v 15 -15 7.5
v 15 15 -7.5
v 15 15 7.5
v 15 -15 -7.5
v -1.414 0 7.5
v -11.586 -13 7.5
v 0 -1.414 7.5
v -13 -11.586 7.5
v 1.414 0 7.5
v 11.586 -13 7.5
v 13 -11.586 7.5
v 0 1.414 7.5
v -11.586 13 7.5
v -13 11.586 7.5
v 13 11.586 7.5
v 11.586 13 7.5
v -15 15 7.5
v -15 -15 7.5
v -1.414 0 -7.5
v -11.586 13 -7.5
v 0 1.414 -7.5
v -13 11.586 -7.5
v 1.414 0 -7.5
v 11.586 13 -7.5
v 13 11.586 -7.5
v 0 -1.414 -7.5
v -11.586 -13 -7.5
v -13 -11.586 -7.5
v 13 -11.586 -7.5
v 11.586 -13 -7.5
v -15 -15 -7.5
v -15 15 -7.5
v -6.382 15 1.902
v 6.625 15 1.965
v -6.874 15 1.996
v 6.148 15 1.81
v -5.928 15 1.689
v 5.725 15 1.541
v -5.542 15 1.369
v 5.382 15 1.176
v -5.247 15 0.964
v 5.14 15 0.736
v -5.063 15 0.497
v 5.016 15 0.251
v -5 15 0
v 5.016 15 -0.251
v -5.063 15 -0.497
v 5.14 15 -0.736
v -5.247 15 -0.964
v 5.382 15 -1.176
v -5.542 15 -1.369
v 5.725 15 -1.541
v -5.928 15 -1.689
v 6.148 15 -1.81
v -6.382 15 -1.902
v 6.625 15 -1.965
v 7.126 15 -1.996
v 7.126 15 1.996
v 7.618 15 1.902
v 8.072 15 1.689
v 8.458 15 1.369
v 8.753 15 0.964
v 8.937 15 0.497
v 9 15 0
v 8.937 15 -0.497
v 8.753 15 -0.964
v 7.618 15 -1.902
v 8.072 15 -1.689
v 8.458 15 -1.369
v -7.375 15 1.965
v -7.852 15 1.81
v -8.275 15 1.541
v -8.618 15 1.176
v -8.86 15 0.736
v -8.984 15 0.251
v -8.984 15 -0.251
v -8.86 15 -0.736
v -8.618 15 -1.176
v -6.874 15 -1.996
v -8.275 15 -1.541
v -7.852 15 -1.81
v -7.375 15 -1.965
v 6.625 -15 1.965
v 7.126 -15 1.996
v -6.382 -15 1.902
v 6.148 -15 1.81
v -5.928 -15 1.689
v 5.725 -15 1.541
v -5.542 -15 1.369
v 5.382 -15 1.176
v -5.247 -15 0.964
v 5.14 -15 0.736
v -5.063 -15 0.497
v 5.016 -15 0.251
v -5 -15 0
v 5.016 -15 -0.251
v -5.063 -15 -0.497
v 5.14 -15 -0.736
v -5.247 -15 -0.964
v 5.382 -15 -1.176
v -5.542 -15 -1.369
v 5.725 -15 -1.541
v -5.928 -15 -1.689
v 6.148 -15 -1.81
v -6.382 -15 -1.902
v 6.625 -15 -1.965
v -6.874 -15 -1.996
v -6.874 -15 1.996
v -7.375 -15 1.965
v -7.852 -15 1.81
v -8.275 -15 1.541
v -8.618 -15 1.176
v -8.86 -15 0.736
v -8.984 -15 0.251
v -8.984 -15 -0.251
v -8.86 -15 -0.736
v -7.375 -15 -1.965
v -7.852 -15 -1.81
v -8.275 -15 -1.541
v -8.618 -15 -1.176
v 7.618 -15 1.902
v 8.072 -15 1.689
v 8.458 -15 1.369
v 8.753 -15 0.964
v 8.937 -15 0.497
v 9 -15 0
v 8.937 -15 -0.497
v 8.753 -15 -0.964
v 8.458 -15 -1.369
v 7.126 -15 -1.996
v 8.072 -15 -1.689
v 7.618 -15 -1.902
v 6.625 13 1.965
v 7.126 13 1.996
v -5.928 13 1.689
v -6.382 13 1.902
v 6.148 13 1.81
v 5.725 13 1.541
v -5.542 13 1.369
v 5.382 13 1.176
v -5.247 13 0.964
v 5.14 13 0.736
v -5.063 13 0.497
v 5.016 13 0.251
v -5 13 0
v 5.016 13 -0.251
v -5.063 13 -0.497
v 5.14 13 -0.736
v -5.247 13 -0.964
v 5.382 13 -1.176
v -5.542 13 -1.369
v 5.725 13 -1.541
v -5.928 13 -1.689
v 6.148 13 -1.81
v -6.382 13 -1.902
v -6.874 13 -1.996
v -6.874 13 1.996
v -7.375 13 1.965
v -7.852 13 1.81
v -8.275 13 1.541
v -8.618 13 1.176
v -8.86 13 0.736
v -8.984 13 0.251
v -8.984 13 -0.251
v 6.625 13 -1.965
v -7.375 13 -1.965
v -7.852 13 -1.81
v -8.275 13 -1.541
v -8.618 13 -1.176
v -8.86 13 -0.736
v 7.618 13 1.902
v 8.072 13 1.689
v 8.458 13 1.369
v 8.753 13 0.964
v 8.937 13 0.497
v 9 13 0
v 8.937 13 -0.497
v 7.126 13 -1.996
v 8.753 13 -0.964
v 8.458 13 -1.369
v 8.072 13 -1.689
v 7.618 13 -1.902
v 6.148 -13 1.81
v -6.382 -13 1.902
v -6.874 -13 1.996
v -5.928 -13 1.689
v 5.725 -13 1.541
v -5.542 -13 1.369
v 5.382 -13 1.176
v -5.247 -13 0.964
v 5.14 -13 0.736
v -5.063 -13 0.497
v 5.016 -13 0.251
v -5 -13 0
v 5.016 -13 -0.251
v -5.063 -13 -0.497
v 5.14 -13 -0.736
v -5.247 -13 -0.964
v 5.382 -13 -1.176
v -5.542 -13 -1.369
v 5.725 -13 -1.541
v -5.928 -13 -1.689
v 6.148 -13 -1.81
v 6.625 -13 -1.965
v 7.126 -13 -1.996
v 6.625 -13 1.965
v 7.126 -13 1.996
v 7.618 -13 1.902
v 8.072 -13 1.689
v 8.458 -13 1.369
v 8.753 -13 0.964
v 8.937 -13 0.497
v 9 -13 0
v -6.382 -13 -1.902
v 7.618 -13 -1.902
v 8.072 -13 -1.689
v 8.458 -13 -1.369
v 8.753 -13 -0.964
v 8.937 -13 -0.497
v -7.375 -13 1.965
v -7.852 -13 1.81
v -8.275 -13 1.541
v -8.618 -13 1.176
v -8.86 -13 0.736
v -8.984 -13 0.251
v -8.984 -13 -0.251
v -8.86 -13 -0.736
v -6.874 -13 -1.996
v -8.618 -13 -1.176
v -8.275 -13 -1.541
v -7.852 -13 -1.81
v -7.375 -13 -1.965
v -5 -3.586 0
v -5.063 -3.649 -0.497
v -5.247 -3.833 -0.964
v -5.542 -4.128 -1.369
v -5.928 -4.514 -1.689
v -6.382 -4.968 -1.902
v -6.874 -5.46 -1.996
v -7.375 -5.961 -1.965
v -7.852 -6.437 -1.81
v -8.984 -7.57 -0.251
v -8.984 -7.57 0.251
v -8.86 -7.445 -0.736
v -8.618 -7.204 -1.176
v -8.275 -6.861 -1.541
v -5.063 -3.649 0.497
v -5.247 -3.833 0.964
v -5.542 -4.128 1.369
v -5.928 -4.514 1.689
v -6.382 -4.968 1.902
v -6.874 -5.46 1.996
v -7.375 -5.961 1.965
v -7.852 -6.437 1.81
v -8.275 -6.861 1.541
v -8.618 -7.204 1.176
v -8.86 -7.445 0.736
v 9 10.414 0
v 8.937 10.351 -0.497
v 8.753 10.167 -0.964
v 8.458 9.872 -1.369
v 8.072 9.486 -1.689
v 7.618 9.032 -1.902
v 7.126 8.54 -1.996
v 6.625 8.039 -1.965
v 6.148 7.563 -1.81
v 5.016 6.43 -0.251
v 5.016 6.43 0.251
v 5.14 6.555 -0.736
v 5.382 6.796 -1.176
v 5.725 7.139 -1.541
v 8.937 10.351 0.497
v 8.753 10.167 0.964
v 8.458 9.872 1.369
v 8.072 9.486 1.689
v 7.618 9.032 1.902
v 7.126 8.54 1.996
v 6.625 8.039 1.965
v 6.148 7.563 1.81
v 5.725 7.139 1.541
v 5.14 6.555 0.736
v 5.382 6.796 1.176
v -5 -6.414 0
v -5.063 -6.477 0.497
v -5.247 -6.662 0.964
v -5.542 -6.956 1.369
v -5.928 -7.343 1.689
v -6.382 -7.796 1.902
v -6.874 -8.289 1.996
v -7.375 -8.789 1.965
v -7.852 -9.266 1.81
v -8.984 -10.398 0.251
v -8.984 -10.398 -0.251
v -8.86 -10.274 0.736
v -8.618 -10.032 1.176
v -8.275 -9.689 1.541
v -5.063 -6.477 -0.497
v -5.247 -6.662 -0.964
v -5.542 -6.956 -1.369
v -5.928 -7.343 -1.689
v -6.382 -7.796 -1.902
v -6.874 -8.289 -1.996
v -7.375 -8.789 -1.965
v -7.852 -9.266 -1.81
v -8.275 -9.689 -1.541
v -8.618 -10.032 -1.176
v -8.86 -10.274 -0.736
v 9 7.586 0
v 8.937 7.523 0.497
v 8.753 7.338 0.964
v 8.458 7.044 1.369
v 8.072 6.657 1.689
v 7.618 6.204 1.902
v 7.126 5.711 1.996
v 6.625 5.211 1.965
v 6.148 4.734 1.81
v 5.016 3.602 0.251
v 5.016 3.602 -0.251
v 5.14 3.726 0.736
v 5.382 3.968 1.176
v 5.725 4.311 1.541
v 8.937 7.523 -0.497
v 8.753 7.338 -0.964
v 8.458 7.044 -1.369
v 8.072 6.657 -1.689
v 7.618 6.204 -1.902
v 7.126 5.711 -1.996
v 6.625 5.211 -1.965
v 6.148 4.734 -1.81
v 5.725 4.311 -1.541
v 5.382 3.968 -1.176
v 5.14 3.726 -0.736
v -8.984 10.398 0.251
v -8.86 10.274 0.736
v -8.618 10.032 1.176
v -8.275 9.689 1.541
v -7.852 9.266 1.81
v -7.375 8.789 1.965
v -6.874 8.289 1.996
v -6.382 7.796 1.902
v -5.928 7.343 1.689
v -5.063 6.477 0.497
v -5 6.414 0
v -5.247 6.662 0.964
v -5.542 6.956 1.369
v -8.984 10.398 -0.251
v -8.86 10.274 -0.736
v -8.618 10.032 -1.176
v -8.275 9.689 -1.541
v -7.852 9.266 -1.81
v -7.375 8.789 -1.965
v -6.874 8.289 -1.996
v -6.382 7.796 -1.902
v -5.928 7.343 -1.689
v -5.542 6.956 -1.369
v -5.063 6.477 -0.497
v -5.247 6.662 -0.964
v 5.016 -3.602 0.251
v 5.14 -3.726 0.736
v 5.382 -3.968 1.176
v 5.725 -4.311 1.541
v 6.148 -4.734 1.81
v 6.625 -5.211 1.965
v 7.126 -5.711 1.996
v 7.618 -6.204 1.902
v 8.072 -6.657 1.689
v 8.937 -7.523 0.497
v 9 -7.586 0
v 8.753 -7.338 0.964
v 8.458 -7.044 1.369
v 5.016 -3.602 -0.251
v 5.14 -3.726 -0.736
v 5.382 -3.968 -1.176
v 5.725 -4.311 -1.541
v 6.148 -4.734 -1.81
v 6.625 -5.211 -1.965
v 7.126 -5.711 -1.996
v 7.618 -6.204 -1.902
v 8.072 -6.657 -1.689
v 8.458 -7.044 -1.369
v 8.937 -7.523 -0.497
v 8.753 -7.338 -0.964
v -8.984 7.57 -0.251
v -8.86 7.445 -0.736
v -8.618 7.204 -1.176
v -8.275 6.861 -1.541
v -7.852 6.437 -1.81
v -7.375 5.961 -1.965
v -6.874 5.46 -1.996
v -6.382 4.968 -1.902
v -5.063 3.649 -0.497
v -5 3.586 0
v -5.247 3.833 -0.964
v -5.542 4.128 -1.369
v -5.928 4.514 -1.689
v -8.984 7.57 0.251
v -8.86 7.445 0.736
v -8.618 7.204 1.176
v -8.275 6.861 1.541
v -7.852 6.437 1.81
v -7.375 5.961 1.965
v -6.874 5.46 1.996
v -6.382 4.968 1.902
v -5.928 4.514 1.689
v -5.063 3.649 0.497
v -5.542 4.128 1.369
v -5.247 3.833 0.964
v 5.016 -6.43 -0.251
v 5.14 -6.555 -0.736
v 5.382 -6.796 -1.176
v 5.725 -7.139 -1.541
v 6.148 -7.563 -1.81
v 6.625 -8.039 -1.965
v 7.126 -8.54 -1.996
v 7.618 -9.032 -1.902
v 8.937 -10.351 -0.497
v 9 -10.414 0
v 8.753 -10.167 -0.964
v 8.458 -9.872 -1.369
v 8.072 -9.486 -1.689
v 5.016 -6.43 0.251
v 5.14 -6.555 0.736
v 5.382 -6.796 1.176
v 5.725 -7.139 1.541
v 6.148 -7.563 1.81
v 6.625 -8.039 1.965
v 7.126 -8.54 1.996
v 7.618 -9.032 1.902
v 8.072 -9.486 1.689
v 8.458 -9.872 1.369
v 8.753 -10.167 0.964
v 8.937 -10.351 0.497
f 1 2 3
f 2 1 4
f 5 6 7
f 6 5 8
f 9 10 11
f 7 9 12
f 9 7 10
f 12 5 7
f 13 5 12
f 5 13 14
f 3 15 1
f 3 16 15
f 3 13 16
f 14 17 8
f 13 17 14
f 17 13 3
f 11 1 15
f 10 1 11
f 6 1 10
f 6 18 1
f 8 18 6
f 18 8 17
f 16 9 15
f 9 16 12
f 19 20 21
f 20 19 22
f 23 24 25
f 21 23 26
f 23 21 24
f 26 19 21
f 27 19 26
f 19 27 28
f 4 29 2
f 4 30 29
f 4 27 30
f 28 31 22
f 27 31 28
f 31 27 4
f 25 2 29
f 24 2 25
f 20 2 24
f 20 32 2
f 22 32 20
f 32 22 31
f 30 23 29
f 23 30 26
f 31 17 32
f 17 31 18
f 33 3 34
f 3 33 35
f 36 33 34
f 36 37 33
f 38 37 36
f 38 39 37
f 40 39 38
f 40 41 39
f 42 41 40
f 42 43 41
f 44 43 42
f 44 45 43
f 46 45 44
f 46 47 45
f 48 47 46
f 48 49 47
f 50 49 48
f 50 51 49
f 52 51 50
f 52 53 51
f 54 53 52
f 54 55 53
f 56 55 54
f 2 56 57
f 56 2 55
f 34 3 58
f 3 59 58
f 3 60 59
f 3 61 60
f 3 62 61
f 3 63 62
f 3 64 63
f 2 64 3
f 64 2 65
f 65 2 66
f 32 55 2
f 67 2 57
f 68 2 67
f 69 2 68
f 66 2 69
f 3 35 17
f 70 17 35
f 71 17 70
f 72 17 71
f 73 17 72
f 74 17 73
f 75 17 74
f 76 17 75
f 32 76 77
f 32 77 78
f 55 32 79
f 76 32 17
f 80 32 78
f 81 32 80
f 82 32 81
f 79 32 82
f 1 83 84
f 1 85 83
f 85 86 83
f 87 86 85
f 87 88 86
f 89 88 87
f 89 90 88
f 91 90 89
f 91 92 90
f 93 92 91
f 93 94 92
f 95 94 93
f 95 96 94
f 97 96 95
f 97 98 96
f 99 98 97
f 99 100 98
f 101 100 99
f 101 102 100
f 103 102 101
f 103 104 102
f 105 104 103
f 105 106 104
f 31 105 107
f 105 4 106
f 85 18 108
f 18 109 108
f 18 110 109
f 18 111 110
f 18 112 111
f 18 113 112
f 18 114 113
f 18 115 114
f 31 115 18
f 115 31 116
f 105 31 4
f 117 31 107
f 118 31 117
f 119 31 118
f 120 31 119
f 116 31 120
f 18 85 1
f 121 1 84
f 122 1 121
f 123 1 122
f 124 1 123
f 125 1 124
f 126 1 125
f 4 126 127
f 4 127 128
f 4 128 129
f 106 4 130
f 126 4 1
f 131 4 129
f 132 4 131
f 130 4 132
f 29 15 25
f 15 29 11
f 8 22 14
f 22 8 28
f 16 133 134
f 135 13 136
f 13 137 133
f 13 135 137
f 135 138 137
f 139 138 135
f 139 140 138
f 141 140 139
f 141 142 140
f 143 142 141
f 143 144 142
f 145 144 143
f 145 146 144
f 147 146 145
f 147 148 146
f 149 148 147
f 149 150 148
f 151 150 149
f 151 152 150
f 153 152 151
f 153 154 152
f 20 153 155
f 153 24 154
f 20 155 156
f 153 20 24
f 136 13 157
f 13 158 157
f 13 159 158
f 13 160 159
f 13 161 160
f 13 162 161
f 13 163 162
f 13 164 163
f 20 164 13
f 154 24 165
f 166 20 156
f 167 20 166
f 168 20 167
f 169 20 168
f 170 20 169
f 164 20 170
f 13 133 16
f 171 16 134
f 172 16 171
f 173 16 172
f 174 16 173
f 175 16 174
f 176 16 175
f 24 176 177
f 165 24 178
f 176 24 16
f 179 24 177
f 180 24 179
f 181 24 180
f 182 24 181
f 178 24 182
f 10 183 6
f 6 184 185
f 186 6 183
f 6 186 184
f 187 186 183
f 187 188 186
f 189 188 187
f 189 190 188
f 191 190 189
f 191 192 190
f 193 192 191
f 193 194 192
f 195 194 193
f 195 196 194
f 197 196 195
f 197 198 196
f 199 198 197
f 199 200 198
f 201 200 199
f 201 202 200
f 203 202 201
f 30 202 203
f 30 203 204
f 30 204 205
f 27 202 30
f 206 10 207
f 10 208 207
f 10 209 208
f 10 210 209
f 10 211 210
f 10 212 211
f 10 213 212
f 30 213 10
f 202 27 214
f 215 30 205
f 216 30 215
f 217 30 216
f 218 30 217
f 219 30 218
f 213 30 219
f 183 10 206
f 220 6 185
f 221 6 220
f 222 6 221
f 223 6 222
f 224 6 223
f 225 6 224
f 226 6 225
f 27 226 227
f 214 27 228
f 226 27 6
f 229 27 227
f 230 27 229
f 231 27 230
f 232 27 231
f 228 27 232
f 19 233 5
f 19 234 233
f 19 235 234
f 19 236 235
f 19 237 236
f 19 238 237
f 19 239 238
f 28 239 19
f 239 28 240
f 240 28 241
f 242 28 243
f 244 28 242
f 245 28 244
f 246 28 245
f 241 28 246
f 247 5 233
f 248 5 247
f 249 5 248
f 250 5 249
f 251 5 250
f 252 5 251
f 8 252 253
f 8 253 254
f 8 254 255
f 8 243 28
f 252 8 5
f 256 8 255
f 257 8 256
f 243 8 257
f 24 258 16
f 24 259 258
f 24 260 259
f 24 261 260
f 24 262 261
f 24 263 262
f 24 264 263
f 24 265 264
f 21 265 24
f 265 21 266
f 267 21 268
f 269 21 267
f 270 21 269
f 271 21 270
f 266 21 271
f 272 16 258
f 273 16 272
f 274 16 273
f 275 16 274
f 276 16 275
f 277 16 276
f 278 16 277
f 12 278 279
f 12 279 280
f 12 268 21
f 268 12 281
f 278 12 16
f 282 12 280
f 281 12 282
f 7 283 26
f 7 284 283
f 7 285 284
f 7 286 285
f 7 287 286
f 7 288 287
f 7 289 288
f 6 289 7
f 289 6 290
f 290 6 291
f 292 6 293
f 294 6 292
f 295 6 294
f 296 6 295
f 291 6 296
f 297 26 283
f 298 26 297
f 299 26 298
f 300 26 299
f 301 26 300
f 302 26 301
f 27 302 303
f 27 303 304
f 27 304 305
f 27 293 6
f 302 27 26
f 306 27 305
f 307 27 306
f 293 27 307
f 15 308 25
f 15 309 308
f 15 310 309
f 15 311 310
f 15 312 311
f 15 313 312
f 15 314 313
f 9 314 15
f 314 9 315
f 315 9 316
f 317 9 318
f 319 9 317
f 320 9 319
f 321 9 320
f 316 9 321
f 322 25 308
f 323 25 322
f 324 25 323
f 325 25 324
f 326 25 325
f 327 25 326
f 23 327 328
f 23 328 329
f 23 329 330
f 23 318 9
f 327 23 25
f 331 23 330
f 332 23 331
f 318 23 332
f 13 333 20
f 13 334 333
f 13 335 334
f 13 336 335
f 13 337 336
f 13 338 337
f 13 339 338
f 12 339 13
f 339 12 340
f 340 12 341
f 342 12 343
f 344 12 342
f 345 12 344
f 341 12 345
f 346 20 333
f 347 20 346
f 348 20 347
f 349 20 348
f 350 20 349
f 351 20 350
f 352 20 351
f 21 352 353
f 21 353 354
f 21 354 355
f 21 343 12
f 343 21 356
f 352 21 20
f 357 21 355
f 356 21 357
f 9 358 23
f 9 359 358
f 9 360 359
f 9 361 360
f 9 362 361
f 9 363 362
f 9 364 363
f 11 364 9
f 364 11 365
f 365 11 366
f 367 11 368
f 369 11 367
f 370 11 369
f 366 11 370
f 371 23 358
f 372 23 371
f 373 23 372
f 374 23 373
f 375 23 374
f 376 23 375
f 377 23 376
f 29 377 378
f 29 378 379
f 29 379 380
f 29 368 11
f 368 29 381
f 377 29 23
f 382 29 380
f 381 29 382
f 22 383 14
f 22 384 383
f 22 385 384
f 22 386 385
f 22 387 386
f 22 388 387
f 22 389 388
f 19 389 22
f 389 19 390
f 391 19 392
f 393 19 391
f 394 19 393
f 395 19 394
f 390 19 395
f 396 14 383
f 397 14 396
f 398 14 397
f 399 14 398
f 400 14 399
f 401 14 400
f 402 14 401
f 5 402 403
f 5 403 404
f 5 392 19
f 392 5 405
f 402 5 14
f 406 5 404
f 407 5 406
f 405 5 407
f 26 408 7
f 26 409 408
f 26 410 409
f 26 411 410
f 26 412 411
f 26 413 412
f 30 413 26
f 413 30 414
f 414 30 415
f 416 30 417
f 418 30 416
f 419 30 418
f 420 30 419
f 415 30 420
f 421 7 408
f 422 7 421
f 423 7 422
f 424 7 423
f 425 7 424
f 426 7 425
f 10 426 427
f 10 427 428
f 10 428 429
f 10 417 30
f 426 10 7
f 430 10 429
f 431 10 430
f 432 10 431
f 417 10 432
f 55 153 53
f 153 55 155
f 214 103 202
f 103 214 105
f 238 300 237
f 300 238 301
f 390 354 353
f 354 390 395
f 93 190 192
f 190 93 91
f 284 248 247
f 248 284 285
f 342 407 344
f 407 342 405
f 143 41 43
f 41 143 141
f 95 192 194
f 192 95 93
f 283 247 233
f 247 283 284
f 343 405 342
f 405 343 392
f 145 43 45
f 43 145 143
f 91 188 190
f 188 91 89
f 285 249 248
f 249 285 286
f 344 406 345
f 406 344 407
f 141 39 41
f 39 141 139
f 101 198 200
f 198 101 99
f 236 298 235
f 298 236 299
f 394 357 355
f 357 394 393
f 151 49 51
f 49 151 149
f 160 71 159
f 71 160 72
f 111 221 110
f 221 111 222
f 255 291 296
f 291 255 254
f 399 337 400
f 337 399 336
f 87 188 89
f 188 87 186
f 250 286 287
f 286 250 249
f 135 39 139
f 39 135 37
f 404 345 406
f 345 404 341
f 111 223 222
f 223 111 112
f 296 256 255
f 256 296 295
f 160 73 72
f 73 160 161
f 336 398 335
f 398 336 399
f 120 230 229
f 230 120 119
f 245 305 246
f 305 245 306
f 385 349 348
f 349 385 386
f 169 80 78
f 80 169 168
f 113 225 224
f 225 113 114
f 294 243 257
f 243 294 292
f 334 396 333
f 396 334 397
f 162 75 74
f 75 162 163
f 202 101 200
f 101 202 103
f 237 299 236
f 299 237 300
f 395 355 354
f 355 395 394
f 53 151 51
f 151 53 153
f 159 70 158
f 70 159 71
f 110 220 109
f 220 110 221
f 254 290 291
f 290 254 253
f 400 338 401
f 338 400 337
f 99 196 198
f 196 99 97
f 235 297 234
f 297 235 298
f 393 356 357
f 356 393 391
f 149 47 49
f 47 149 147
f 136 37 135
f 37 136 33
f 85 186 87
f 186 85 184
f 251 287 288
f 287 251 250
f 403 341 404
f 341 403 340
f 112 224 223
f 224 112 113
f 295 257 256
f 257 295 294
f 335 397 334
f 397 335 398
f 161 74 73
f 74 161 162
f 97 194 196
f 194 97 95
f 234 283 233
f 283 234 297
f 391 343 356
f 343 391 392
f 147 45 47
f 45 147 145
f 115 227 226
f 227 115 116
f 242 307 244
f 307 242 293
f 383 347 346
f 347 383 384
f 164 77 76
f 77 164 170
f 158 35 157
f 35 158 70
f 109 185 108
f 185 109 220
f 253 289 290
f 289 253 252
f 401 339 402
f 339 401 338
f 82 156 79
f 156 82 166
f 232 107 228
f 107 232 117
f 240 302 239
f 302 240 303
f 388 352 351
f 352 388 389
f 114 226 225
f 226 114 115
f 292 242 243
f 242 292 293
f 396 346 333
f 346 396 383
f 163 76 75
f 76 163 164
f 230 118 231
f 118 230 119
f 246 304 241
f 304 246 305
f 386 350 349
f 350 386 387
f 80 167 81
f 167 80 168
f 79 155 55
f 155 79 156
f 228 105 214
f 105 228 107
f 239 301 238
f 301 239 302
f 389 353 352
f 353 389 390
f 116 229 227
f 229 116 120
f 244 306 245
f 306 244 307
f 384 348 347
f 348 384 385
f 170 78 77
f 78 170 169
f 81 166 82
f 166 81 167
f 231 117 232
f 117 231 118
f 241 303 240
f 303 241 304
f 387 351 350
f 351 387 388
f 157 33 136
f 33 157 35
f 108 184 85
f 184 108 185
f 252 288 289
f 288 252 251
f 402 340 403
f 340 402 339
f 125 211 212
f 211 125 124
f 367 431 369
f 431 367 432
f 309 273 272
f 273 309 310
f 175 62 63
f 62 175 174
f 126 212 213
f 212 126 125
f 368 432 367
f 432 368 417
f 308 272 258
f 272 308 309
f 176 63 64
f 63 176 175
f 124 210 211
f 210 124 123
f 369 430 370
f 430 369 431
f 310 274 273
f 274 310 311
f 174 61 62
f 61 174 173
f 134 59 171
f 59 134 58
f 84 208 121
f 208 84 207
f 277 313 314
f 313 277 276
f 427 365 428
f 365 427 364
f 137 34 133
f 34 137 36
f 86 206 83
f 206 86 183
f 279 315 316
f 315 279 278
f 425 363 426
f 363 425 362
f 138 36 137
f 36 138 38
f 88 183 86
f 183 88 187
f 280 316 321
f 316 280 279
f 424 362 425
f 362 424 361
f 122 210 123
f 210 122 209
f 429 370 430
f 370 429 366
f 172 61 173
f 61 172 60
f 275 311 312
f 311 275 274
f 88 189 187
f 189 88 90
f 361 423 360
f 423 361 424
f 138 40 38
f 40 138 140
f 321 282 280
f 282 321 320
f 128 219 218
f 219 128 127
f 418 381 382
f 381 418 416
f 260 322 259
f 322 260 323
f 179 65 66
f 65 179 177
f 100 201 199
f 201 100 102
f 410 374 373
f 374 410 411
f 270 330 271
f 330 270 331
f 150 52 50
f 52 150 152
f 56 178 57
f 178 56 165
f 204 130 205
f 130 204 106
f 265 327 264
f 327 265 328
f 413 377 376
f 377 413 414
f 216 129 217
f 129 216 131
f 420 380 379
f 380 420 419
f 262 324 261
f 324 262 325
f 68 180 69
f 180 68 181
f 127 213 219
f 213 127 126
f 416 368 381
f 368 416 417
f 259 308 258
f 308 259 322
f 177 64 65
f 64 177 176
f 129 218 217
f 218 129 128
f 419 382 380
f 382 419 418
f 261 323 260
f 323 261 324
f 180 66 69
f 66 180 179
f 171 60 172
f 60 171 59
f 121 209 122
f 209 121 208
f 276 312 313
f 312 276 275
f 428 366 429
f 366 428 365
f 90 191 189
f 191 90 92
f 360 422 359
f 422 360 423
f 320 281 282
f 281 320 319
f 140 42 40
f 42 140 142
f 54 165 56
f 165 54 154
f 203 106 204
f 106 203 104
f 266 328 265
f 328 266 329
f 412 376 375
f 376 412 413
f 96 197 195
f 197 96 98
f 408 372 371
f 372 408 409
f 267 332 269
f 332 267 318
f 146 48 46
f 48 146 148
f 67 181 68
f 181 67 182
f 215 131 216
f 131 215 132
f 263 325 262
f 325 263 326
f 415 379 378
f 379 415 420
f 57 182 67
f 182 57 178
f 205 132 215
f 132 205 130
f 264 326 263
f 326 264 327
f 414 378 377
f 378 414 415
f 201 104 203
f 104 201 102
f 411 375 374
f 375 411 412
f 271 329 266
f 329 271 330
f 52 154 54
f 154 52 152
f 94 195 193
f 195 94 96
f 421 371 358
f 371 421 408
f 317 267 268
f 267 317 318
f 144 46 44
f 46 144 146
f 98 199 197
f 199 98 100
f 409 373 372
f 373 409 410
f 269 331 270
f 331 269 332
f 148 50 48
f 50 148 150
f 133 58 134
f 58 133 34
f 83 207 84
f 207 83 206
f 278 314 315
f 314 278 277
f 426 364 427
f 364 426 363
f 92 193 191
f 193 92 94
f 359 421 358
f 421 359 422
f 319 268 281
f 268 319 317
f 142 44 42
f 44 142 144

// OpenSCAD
$fn = 25;
epsilon = 0.001; // Used to resolve manifold issues
sx = 30;
sy = 30;
sz = 15;
thickness = 2;

holes_distance = 14;
holes_radius = 2;

difference() {
	union() {
		// Shell
		difference() {
			cube([sx, sy, sz], true);
			cube([sx - thickness * 2, sy - thickness * 2, sz+1], true);
		}

		// Supports
		intersection() {
			union() {
				rotate([0, 0, 45]) cube([sx * 2, thickness, sz], true);
				rotate([0, 0, -45]) cube([sx * 2, thickness, sz], true);
			}
			cube([sx, sy, sz], true);
		}
	}
	
	// Holes
	rotate([90, 0, 0]) {
		translate([-holes_distance/2, 0, 0]) cylinder(sy+1, holes_radius, holes_radius, true);
		translate([holes_distance/2, 0, 0]) cylinder(sy+1, holes_radius, holes_radius, true);
	}
}
